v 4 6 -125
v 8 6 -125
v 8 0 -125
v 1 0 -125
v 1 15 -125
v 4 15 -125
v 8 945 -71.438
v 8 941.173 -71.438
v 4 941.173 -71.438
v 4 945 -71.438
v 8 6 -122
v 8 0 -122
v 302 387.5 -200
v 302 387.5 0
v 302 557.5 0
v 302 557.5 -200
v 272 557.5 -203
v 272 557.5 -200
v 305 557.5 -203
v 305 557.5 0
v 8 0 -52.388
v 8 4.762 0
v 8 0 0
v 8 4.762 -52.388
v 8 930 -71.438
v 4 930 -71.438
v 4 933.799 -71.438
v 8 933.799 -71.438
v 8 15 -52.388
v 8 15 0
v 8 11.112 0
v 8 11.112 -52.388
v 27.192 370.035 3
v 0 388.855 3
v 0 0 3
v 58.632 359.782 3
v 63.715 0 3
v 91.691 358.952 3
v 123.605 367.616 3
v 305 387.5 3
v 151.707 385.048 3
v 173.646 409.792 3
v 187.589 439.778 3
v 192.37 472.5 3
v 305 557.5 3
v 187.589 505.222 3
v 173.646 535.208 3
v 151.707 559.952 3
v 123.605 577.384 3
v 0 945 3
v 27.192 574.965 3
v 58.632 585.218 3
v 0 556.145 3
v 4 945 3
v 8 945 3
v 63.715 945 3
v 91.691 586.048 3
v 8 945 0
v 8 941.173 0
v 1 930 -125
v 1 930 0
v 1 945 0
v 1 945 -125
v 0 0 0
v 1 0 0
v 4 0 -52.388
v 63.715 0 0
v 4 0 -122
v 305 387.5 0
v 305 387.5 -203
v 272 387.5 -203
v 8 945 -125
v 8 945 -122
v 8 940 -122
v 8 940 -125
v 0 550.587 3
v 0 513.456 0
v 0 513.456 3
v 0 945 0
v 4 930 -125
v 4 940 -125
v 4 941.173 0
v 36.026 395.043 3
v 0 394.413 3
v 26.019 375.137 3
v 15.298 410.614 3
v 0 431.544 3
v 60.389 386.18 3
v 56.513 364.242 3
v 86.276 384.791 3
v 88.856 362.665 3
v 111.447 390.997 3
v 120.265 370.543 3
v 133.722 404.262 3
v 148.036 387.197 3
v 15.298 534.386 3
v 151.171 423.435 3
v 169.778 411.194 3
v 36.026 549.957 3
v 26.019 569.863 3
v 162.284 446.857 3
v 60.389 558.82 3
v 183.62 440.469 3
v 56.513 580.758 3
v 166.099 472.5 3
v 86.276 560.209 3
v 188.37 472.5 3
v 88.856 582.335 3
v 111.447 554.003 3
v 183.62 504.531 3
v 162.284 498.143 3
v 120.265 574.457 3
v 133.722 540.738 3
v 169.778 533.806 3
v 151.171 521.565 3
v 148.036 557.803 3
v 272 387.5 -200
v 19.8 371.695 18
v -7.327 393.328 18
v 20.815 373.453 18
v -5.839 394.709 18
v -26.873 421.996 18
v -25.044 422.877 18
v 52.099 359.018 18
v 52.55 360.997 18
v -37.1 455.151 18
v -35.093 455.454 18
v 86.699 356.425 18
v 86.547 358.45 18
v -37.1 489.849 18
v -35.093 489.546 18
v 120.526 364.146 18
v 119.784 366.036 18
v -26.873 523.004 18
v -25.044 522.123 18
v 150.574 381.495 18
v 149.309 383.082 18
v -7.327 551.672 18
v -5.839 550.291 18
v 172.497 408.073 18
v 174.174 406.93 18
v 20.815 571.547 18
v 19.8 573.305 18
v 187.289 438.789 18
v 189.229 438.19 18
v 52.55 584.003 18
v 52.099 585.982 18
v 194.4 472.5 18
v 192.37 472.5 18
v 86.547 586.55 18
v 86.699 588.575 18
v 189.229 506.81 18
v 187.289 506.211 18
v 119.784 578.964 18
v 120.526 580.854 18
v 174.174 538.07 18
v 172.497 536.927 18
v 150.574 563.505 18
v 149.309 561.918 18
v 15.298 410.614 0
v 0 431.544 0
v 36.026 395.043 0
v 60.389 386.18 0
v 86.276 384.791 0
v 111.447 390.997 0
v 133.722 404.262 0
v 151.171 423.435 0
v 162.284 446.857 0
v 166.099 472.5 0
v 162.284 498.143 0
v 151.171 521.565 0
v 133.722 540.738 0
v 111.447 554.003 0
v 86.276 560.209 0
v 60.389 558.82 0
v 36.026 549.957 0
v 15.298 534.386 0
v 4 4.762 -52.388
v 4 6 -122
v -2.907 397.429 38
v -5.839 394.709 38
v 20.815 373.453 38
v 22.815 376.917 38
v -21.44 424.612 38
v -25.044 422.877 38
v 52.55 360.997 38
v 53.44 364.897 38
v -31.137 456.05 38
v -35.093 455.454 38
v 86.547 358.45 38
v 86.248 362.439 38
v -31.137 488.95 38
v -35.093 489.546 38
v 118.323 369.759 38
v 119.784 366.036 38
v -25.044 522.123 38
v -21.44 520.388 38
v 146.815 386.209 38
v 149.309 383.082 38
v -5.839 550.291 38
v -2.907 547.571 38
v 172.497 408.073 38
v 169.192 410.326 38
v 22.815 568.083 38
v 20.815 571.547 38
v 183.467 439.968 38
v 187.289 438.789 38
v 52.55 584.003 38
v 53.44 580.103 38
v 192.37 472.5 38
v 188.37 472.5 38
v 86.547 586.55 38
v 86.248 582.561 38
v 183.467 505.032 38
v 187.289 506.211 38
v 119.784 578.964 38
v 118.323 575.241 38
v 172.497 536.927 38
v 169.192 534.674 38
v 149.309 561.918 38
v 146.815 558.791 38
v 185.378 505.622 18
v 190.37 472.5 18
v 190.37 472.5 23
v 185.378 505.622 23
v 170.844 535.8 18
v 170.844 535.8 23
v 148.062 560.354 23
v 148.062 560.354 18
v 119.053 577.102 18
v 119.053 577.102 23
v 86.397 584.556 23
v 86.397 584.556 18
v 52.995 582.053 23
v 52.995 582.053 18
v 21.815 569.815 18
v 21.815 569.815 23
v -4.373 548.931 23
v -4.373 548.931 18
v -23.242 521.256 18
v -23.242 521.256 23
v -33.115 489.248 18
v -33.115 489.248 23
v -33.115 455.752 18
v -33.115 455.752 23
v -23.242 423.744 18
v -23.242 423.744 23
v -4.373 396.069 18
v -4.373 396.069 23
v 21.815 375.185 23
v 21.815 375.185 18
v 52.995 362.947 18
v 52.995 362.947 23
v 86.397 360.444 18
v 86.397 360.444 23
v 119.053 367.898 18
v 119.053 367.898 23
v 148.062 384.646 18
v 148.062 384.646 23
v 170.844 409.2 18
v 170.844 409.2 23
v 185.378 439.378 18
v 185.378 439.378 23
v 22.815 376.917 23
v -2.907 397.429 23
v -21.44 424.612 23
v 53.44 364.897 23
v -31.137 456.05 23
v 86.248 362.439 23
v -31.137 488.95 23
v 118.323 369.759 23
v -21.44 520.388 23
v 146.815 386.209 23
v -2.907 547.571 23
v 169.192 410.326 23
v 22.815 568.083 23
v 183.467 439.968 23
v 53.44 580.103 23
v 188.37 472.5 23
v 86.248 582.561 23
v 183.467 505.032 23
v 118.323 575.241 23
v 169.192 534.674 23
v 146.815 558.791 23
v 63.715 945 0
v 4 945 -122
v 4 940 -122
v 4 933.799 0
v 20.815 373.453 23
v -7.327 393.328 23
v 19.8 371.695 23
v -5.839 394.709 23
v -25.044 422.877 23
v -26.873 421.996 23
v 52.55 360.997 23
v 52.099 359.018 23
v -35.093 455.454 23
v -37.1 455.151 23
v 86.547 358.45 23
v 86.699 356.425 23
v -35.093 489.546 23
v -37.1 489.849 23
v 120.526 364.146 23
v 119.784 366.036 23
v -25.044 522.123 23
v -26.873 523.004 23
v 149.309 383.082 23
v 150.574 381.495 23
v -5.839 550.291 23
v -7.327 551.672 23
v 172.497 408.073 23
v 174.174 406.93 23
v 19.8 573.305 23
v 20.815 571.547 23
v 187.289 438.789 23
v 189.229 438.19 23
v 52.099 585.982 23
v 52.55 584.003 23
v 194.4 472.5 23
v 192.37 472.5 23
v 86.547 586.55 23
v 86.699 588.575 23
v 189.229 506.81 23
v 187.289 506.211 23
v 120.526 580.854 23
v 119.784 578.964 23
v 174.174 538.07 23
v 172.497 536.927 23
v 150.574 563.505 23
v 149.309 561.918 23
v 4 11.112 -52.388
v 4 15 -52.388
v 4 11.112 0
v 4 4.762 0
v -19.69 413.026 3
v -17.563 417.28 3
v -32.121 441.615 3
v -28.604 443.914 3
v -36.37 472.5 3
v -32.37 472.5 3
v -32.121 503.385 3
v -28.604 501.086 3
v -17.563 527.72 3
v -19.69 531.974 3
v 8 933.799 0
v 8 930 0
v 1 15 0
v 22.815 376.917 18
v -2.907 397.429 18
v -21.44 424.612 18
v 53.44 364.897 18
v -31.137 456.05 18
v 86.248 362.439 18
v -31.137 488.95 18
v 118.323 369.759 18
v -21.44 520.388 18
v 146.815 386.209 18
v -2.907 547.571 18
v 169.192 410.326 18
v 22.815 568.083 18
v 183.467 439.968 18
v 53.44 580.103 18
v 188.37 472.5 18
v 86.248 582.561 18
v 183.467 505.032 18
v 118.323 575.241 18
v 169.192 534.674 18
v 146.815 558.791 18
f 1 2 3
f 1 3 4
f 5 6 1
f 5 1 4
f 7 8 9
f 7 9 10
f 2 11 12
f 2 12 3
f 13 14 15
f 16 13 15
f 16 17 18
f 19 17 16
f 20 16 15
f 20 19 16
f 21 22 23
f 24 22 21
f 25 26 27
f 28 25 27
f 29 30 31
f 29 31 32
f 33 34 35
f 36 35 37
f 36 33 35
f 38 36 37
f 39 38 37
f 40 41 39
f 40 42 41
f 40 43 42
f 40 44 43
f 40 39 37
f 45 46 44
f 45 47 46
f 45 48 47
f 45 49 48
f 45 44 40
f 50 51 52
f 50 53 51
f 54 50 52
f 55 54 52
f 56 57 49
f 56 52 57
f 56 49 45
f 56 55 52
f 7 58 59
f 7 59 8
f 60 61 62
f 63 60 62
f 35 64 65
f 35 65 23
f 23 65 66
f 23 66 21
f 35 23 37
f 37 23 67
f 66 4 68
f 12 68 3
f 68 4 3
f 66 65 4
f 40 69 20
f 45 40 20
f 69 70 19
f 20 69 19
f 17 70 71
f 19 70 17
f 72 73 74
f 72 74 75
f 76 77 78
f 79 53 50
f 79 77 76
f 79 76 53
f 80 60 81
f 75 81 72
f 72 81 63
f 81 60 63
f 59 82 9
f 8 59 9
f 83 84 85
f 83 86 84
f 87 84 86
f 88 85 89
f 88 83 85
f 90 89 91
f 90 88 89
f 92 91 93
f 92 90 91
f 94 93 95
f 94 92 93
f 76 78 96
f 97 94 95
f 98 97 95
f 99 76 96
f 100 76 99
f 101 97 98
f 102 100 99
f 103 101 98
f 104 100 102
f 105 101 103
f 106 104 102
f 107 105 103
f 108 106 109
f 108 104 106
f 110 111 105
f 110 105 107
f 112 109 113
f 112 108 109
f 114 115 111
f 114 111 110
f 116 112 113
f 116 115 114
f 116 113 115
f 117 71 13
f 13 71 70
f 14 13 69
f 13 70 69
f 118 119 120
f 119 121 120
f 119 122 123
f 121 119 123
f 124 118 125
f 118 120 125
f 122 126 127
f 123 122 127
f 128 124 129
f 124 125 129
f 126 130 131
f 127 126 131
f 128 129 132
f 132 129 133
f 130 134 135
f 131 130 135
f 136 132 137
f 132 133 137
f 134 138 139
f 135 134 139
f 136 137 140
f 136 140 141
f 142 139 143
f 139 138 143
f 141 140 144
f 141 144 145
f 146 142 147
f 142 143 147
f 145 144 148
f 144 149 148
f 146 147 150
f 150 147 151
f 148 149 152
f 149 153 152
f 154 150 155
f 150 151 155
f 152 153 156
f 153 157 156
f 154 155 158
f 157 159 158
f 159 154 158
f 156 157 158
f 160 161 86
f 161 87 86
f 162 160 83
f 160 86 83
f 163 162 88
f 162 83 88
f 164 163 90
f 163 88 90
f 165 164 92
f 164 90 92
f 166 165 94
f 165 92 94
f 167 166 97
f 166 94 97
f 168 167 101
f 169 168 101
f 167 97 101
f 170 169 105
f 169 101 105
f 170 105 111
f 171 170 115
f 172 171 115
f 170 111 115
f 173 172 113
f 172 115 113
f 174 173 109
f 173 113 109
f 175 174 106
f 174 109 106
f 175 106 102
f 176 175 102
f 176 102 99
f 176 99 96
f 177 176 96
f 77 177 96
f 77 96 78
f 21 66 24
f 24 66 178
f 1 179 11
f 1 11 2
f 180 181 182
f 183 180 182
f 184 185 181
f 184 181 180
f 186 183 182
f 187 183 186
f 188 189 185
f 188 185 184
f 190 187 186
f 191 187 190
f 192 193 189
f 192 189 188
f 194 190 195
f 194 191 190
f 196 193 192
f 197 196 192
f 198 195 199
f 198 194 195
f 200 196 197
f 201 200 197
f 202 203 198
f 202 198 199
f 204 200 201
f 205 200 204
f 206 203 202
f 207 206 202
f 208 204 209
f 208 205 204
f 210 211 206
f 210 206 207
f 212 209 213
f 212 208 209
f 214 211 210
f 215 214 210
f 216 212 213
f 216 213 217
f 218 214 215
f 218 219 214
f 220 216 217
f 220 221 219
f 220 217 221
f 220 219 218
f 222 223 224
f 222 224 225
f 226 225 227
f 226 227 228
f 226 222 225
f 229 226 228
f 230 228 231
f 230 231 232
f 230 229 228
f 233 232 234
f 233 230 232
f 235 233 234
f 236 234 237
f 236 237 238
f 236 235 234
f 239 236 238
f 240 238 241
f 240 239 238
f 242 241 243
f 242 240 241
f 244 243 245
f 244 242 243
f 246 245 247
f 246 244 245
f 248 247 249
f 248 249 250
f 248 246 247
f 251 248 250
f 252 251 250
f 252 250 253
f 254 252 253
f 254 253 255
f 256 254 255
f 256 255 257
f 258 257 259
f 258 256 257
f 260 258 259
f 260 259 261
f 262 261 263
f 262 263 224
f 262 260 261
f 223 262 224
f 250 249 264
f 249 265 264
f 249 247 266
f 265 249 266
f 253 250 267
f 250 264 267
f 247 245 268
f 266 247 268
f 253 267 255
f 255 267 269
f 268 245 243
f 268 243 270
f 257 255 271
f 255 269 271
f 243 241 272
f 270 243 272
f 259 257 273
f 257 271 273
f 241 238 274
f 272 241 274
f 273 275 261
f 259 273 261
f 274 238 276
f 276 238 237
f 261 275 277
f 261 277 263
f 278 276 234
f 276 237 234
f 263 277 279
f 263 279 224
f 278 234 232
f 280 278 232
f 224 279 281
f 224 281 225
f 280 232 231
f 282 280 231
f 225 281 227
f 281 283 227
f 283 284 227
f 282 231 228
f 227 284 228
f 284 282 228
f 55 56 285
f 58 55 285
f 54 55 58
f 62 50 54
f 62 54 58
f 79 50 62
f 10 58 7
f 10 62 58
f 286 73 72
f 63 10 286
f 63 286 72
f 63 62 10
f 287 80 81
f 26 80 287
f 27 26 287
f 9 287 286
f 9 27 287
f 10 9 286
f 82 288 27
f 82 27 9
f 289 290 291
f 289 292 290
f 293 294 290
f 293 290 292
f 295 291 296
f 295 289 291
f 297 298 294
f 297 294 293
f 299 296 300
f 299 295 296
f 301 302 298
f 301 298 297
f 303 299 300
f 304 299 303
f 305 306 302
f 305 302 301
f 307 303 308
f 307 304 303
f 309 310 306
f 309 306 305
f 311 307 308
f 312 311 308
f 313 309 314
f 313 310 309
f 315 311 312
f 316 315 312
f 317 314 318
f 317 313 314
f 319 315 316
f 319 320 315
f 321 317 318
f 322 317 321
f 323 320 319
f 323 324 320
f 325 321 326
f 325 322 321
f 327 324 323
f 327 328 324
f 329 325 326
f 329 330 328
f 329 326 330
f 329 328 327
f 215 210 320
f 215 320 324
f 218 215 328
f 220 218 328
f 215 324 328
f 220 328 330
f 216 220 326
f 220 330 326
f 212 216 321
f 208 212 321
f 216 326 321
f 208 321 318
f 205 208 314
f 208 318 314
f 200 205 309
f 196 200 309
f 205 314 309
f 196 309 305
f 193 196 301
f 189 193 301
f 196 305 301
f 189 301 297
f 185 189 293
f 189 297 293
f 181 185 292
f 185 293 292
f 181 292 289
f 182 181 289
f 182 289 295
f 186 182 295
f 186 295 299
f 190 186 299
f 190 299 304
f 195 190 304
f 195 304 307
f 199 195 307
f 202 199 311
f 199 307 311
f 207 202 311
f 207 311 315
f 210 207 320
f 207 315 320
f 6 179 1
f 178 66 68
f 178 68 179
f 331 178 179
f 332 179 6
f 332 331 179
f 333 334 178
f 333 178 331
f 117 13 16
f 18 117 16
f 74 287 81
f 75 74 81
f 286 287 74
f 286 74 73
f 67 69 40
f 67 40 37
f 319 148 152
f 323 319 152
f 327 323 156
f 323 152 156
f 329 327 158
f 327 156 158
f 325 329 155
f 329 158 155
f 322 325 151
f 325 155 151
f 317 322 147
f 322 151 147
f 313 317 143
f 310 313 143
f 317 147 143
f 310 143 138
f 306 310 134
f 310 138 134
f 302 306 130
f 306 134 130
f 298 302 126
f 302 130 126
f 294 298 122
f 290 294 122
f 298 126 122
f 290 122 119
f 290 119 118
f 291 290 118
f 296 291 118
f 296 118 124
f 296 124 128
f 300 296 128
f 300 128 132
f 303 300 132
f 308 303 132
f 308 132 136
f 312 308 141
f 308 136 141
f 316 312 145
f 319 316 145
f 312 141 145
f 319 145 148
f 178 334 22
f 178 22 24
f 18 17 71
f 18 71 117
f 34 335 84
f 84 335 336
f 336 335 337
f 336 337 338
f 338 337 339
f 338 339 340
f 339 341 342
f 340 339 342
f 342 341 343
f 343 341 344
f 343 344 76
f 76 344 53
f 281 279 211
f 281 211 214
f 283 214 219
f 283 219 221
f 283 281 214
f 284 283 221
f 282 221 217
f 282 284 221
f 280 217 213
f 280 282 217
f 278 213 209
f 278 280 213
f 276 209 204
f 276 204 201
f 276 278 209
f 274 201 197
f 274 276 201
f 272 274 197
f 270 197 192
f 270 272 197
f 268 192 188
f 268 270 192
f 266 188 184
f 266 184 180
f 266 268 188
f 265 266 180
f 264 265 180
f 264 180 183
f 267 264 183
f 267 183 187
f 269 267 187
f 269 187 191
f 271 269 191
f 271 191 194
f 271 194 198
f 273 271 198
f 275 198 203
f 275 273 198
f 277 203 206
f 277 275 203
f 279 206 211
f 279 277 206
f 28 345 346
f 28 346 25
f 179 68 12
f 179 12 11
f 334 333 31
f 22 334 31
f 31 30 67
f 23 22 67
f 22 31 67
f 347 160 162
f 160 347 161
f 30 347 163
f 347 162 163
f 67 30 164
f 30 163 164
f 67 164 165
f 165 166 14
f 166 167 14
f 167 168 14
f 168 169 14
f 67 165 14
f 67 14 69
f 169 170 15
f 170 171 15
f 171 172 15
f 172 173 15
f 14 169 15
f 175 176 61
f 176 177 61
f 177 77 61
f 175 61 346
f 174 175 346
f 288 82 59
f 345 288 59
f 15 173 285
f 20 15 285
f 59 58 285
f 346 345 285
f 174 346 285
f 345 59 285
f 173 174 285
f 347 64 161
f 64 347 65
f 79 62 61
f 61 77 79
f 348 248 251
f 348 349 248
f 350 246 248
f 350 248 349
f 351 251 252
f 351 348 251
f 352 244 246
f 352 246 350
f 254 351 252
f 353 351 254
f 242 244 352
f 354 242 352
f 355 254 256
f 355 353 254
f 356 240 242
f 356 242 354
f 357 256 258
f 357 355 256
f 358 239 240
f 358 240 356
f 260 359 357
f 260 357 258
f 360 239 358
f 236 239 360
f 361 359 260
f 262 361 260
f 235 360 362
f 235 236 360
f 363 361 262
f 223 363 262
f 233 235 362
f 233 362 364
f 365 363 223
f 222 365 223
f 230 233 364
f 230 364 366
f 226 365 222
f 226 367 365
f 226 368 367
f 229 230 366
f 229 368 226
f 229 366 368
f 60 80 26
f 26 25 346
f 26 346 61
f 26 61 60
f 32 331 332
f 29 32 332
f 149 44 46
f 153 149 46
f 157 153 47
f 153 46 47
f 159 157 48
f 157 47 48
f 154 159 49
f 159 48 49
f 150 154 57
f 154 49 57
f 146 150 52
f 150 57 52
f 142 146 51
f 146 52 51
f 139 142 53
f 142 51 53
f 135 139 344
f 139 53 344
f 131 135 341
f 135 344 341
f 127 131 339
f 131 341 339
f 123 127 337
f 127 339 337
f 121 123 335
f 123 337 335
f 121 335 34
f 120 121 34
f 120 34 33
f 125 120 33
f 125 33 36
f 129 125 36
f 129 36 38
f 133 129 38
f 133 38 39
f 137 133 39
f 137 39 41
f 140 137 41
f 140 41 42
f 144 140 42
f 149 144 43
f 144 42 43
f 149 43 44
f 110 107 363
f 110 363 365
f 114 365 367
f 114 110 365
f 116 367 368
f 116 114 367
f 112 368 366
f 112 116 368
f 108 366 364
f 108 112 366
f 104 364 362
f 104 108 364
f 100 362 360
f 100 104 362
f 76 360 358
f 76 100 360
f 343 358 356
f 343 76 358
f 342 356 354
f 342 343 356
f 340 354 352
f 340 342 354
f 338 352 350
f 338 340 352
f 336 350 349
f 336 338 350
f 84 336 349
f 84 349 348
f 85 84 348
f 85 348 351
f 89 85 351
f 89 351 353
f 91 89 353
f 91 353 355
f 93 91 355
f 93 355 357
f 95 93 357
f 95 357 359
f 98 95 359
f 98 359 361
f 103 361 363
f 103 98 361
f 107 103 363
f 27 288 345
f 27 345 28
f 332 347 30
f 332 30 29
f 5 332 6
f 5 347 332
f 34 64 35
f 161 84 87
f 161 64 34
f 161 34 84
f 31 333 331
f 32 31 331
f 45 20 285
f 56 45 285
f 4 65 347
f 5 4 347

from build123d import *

# Parameters (mm, degrees)
SKETCH1_W       = 305
SKETCH1_H       = 945
EXTRUDE1_DEPTH  = 3
SKETCH2_R       = 114.37
SKETCH2_R_2     = 110.37
EXTRUDE2_DEPTH  = 15
SKETCH3_W       = 3
SKETCH3_H       = 15
EXTRUDE3_DEPTH  = 125
SKETCH4_W       = 3
SKETCH4_H       = 5
SKETCH4_H_2     = 6
SKETCH4_W_2     = 74.4375
SKETCH4_H_3     = 3.826546867
SKETCH4_H_4     = 3.798552334
SKETCH4_W_3     = 55.3875
SKETCH4_H_5     = 4.7625
SKETCH4_H_6     = 3.8875
EXTRUDE4_DEPTH  = 4
SKETCH5_W       = 3
SKETCH5_H       = 170
EXTRUDE5_DEPTH  = 203
SKETCH6_W       = 3
SKETCH6_H       = 170
EXTRUDE6_DEPTH  = 30
EXTRUDE7_DEPTH  = 19
SKETCH13_R      = 88.098729295
EXTRUDE10_DEPTH = 207
SKETCH22_R      = 116.4
SKETCH22_R_2    = 112.37
EXTRUDE17_DEPTH = 5
SKETCH23_R      = 114.37
SKETCH23_R_2    = 110.37
EXTRUDE18_DEPTH = 15


with BuildPart() as part:
    # Sketch1 → Extrude1 (new body)
    with BuildSketch(Plane.XY):
        with Locations((152.5, 472.5)):
            Rectangle(SKETCH1_W, SKETCH1_H)
    extrude(amount=EXTRUDE1_DEPTH)

    # Sketch2 → Extrude2 (add)
    with BuildSketch(Plane.XY.offset(3)):
        with Locations((78, 472.5)):
            Circle(SKETCH2_R)
        with Locations((78, 472.5)):
            Circle(SKETCH2_R_2, mode=Mode.SUBTRACT)
    extrude(amount=EXTRUDE2_DEPTH)

    # Sketch3 → Extrude3 (add)
    with BuildSketch(Plane(origin=(0, 0, 0), x_dir=(-1, 0, 0), z_dir=(0, 0, -1))):
        with Locations((-2.5, 937.5)):
            Rectangle(SKETCH3_W, SKETCH3_H)
        with Locations((-2.5, 7.5)):
            Rectangle(SKETCH3_W, SKETCH3_H)
    extrude(amount=EXTRUDE3_DEPTH)

    # Sketch4 → Extrude4 (add)
    with BuildSketch(Plane(origin=(4, 0, 0), x_dir=(0, 0, -1), z_dir=(1, 0, 0))):
        with Locations((123.5, 942.5)):
            Rectangle(SKETCH4_W, SKETCH4_H)
        with Locations((123.5, 3)):
            Rectangle(SKETCH4_W, SKETCH4_H_2)
        with Locations((34.21875, 943.086726567)):
            Rectangle(SKETCH4_W_2, SKETCH4_H_3)
        with Locations((34.21875, 931.899276167)):
            Rectangle(SKETCH4_W_2, SKETCH4_H_4)
        with Locations((24.69375, 2.38125)):
            Rectangle(SKETCH4_W_3, SKETCH4_H_5)
        with Locations((24.69375, 13.05625)):
            Rectangle(SKETCH4_W_3, SKETCH4_H_6)
    extrude(amount=EXTRUDE4_DEPTH)

    # Sketch5 → Extrude5 (add)
    with BuildSketch(Plane(origin=(0, 0, 0), x_dir=(-1, 0, 0), z_dir=(0, 0, -1))):
        with Locations((-303.5, 472.5)):
            Rectangle(SKETCH5_W, SKETCH5_H)
    extrude(amount=EXTRUDE5_DEPTH)

    # Sketch6 → Extrude6 (add)
    with BuildSketch(Plane.ZY.offset(-302)):
        with Locations((-201.5, 472.5)):
            Rectangle(SKETCH6_W, SKETCH6_H)
    extrude(amount=EXTRUDE6_DEPTH)

    # Sketch7 → Extrude7 (cut, through all)
    with BuildSketch(Plane(origin=(0, 0, 0), x_dir=(-1, 0, 0), z_dir=(0, 0, -1))):
        Polygon((-305, 557.5), (-63.714944106, 945), (-305, 945), align=None)
        Polygon((-305, 387.5), (-63.714944106, 0), (-305, 0), align=None)
    extrude(amount=-EXTRUDE7_DEPTH, mode=Mode.SUBTRACT)

    # Sketch13 → Extrude10 (cut, through all)
    with BuildSketch(Plane.XY.offset(3)):
        with Locations((78, 472.5)):
            Circle(SKETCH13_R)
    extrude(amount=-EXTRUDE10_DEPTH, mode=Mode.SUBTRACT)

    # Sketch22 → Extrude17 (add)
    with BuildSketch(Plane.XY.offset(18)):
        with Locations((78, 472.5)):
            Circle(SKETCH22_R)
        with Locations((78, 472.5)):
            Circle(SKETCH22_R_2, mode=Mode.SUBTRACT)
    extrude(amount=EXTRUDE17_DEPTH)

    # Sketch23 → Extrude18 (add)
    with BuildSketch(Plane.XY.offset(23)):
        with Locations((78, 472.5)):
            Circle(SKETCH23_R)
        with Locations((78, 472.5)):
            Circle(SKETCH23_R_2, mode=Mode.SUBTRACT)
    extrude(amount=EXTRUDE18_DEPTH)


solid = part.part
